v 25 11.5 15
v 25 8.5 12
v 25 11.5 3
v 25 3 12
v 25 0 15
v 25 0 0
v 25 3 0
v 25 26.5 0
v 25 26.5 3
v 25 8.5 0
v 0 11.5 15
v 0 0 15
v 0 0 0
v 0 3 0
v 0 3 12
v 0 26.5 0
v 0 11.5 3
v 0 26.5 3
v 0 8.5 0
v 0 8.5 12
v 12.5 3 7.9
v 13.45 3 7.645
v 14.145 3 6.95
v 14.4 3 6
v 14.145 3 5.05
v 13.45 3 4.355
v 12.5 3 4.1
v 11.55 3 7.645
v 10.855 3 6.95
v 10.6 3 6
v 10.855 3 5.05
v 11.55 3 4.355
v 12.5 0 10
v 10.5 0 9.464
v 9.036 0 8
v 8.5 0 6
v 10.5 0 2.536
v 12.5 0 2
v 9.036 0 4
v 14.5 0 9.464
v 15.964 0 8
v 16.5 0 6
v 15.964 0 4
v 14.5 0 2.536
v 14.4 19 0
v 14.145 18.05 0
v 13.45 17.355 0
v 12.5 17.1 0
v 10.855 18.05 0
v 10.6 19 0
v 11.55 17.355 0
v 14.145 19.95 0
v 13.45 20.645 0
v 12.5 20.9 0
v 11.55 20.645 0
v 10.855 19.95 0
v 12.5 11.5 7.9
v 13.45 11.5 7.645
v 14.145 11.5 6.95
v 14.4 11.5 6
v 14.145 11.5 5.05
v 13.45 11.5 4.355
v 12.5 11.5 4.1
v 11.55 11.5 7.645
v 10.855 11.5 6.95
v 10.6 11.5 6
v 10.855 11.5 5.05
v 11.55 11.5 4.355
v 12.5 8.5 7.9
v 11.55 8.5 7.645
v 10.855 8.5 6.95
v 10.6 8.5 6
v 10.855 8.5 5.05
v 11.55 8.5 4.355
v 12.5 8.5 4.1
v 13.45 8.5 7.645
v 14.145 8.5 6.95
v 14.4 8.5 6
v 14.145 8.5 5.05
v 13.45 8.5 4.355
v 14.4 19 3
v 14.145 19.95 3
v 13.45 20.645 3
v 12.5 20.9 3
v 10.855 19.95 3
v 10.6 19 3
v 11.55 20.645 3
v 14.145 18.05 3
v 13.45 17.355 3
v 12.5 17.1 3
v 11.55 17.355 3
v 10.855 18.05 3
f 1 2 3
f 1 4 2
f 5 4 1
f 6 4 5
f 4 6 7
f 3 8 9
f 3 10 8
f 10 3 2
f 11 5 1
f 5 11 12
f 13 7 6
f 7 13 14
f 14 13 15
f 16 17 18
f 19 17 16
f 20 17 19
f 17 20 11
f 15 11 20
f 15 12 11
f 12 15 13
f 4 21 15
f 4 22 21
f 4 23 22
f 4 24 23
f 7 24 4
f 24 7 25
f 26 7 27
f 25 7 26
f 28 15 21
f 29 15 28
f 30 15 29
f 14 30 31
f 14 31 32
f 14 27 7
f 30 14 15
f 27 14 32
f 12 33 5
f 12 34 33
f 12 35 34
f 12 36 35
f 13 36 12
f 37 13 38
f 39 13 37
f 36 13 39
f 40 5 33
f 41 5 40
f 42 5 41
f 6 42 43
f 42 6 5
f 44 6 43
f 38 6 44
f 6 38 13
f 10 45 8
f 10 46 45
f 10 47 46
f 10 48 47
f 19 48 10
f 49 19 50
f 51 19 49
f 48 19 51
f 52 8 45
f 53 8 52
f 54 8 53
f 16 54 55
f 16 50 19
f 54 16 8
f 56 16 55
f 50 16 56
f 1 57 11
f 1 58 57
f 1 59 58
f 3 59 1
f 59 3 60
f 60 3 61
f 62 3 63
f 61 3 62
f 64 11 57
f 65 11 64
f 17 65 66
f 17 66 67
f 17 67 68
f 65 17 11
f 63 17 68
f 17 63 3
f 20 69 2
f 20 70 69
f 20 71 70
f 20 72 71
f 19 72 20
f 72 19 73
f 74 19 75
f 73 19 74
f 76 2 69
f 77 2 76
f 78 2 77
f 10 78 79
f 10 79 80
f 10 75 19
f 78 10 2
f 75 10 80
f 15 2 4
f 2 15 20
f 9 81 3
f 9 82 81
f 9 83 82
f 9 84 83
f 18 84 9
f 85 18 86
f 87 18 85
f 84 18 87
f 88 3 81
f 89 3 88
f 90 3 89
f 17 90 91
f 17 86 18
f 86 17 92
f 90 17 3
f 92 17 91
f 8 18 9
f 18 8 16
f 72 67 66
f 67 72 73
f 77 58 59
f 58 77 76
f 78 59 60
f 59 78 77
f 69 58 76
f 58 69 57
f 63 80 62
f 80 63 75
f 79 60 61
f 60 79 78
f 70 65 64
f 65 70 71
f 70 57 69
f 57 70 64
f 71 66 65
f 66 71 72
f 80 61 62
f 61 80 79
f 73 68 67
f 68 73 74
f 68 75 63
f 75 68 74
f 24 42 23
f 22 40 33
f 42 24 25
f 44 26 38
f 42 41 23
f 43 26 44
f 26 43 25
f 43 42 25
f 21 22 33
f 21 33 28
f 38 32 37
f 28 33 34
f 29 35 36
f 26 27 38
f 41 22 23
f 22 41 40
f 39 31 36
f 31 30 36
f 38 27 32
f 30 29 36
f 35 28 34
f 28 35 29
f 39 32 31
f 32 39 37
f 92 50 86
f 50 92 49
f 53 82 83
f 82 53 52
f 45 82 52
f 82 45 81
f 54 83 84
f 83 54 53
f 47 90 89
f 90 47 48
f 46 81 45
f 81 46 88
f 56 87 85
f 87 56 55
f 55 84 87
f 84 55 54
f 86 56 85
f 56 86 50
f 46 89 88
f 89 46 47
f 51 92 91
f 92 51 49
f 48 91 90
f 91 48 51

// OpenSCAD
difference(){
	union() {
		cube(size = [25, 3, 15]);
		translate(v = [0, 8.5000000000, 0]) {
			cube(size = [25, 3, 15]);
		}
		translate(v = [0, 0, 12]) {
			translate(v = [0, 0, 0]) {
				cube(size = [25, 11.5000000000, 3]);
			}
		}
		translate(v = [0, 11.5000000000, 0]) {
			cube(size = [25, 15, 3]);
		}
		translate(v = [12.5000000000, 0, 6.0000000000]) {
			rotate(a = 90, v = [1, 0, 0]) {
			}
		}
		translate(v = [12.5000000000, 19.0000000000, 8]) {
		}
	}
	/* Holes Below*/
	union(){
		translate(v = [12.5000000000, 0, 6.0000000000]){
			rotate(a = 90, v = [1, 0, 0]){
				union() {
					union() {
						translate(v = [0, 0, -12.5000000000]) {
							cylinder($fn = 12, h = 12.5000000000, r = 1.9000000000);
						}
						translate(v = [0, 0, -3]) {
							cylinder($fn = 12, h = 3, r1 = 1.9000000000, r2 = 4);
						}
					}
					cylinder($fn = 12, h = 1, r = 4);
				}
			}
		}
		translate(v = [12.5000000000, 19.0000000000, 8]){
			union() {
				union() {
					translate(v = [0, 0, -9]) {
						cylinder($fn = 12, h = 9, r = 1.9000000000);
					}
					translate(v = [0, 0, -3]) {
						cylinder($fn = 12, h = 3, r1 = 1.9000000000, r2 = 4);
					}
				}
				cylinder($fn = 12, h = 1, r = 4);
			}
		}
	} /* End Holes */ 
}
